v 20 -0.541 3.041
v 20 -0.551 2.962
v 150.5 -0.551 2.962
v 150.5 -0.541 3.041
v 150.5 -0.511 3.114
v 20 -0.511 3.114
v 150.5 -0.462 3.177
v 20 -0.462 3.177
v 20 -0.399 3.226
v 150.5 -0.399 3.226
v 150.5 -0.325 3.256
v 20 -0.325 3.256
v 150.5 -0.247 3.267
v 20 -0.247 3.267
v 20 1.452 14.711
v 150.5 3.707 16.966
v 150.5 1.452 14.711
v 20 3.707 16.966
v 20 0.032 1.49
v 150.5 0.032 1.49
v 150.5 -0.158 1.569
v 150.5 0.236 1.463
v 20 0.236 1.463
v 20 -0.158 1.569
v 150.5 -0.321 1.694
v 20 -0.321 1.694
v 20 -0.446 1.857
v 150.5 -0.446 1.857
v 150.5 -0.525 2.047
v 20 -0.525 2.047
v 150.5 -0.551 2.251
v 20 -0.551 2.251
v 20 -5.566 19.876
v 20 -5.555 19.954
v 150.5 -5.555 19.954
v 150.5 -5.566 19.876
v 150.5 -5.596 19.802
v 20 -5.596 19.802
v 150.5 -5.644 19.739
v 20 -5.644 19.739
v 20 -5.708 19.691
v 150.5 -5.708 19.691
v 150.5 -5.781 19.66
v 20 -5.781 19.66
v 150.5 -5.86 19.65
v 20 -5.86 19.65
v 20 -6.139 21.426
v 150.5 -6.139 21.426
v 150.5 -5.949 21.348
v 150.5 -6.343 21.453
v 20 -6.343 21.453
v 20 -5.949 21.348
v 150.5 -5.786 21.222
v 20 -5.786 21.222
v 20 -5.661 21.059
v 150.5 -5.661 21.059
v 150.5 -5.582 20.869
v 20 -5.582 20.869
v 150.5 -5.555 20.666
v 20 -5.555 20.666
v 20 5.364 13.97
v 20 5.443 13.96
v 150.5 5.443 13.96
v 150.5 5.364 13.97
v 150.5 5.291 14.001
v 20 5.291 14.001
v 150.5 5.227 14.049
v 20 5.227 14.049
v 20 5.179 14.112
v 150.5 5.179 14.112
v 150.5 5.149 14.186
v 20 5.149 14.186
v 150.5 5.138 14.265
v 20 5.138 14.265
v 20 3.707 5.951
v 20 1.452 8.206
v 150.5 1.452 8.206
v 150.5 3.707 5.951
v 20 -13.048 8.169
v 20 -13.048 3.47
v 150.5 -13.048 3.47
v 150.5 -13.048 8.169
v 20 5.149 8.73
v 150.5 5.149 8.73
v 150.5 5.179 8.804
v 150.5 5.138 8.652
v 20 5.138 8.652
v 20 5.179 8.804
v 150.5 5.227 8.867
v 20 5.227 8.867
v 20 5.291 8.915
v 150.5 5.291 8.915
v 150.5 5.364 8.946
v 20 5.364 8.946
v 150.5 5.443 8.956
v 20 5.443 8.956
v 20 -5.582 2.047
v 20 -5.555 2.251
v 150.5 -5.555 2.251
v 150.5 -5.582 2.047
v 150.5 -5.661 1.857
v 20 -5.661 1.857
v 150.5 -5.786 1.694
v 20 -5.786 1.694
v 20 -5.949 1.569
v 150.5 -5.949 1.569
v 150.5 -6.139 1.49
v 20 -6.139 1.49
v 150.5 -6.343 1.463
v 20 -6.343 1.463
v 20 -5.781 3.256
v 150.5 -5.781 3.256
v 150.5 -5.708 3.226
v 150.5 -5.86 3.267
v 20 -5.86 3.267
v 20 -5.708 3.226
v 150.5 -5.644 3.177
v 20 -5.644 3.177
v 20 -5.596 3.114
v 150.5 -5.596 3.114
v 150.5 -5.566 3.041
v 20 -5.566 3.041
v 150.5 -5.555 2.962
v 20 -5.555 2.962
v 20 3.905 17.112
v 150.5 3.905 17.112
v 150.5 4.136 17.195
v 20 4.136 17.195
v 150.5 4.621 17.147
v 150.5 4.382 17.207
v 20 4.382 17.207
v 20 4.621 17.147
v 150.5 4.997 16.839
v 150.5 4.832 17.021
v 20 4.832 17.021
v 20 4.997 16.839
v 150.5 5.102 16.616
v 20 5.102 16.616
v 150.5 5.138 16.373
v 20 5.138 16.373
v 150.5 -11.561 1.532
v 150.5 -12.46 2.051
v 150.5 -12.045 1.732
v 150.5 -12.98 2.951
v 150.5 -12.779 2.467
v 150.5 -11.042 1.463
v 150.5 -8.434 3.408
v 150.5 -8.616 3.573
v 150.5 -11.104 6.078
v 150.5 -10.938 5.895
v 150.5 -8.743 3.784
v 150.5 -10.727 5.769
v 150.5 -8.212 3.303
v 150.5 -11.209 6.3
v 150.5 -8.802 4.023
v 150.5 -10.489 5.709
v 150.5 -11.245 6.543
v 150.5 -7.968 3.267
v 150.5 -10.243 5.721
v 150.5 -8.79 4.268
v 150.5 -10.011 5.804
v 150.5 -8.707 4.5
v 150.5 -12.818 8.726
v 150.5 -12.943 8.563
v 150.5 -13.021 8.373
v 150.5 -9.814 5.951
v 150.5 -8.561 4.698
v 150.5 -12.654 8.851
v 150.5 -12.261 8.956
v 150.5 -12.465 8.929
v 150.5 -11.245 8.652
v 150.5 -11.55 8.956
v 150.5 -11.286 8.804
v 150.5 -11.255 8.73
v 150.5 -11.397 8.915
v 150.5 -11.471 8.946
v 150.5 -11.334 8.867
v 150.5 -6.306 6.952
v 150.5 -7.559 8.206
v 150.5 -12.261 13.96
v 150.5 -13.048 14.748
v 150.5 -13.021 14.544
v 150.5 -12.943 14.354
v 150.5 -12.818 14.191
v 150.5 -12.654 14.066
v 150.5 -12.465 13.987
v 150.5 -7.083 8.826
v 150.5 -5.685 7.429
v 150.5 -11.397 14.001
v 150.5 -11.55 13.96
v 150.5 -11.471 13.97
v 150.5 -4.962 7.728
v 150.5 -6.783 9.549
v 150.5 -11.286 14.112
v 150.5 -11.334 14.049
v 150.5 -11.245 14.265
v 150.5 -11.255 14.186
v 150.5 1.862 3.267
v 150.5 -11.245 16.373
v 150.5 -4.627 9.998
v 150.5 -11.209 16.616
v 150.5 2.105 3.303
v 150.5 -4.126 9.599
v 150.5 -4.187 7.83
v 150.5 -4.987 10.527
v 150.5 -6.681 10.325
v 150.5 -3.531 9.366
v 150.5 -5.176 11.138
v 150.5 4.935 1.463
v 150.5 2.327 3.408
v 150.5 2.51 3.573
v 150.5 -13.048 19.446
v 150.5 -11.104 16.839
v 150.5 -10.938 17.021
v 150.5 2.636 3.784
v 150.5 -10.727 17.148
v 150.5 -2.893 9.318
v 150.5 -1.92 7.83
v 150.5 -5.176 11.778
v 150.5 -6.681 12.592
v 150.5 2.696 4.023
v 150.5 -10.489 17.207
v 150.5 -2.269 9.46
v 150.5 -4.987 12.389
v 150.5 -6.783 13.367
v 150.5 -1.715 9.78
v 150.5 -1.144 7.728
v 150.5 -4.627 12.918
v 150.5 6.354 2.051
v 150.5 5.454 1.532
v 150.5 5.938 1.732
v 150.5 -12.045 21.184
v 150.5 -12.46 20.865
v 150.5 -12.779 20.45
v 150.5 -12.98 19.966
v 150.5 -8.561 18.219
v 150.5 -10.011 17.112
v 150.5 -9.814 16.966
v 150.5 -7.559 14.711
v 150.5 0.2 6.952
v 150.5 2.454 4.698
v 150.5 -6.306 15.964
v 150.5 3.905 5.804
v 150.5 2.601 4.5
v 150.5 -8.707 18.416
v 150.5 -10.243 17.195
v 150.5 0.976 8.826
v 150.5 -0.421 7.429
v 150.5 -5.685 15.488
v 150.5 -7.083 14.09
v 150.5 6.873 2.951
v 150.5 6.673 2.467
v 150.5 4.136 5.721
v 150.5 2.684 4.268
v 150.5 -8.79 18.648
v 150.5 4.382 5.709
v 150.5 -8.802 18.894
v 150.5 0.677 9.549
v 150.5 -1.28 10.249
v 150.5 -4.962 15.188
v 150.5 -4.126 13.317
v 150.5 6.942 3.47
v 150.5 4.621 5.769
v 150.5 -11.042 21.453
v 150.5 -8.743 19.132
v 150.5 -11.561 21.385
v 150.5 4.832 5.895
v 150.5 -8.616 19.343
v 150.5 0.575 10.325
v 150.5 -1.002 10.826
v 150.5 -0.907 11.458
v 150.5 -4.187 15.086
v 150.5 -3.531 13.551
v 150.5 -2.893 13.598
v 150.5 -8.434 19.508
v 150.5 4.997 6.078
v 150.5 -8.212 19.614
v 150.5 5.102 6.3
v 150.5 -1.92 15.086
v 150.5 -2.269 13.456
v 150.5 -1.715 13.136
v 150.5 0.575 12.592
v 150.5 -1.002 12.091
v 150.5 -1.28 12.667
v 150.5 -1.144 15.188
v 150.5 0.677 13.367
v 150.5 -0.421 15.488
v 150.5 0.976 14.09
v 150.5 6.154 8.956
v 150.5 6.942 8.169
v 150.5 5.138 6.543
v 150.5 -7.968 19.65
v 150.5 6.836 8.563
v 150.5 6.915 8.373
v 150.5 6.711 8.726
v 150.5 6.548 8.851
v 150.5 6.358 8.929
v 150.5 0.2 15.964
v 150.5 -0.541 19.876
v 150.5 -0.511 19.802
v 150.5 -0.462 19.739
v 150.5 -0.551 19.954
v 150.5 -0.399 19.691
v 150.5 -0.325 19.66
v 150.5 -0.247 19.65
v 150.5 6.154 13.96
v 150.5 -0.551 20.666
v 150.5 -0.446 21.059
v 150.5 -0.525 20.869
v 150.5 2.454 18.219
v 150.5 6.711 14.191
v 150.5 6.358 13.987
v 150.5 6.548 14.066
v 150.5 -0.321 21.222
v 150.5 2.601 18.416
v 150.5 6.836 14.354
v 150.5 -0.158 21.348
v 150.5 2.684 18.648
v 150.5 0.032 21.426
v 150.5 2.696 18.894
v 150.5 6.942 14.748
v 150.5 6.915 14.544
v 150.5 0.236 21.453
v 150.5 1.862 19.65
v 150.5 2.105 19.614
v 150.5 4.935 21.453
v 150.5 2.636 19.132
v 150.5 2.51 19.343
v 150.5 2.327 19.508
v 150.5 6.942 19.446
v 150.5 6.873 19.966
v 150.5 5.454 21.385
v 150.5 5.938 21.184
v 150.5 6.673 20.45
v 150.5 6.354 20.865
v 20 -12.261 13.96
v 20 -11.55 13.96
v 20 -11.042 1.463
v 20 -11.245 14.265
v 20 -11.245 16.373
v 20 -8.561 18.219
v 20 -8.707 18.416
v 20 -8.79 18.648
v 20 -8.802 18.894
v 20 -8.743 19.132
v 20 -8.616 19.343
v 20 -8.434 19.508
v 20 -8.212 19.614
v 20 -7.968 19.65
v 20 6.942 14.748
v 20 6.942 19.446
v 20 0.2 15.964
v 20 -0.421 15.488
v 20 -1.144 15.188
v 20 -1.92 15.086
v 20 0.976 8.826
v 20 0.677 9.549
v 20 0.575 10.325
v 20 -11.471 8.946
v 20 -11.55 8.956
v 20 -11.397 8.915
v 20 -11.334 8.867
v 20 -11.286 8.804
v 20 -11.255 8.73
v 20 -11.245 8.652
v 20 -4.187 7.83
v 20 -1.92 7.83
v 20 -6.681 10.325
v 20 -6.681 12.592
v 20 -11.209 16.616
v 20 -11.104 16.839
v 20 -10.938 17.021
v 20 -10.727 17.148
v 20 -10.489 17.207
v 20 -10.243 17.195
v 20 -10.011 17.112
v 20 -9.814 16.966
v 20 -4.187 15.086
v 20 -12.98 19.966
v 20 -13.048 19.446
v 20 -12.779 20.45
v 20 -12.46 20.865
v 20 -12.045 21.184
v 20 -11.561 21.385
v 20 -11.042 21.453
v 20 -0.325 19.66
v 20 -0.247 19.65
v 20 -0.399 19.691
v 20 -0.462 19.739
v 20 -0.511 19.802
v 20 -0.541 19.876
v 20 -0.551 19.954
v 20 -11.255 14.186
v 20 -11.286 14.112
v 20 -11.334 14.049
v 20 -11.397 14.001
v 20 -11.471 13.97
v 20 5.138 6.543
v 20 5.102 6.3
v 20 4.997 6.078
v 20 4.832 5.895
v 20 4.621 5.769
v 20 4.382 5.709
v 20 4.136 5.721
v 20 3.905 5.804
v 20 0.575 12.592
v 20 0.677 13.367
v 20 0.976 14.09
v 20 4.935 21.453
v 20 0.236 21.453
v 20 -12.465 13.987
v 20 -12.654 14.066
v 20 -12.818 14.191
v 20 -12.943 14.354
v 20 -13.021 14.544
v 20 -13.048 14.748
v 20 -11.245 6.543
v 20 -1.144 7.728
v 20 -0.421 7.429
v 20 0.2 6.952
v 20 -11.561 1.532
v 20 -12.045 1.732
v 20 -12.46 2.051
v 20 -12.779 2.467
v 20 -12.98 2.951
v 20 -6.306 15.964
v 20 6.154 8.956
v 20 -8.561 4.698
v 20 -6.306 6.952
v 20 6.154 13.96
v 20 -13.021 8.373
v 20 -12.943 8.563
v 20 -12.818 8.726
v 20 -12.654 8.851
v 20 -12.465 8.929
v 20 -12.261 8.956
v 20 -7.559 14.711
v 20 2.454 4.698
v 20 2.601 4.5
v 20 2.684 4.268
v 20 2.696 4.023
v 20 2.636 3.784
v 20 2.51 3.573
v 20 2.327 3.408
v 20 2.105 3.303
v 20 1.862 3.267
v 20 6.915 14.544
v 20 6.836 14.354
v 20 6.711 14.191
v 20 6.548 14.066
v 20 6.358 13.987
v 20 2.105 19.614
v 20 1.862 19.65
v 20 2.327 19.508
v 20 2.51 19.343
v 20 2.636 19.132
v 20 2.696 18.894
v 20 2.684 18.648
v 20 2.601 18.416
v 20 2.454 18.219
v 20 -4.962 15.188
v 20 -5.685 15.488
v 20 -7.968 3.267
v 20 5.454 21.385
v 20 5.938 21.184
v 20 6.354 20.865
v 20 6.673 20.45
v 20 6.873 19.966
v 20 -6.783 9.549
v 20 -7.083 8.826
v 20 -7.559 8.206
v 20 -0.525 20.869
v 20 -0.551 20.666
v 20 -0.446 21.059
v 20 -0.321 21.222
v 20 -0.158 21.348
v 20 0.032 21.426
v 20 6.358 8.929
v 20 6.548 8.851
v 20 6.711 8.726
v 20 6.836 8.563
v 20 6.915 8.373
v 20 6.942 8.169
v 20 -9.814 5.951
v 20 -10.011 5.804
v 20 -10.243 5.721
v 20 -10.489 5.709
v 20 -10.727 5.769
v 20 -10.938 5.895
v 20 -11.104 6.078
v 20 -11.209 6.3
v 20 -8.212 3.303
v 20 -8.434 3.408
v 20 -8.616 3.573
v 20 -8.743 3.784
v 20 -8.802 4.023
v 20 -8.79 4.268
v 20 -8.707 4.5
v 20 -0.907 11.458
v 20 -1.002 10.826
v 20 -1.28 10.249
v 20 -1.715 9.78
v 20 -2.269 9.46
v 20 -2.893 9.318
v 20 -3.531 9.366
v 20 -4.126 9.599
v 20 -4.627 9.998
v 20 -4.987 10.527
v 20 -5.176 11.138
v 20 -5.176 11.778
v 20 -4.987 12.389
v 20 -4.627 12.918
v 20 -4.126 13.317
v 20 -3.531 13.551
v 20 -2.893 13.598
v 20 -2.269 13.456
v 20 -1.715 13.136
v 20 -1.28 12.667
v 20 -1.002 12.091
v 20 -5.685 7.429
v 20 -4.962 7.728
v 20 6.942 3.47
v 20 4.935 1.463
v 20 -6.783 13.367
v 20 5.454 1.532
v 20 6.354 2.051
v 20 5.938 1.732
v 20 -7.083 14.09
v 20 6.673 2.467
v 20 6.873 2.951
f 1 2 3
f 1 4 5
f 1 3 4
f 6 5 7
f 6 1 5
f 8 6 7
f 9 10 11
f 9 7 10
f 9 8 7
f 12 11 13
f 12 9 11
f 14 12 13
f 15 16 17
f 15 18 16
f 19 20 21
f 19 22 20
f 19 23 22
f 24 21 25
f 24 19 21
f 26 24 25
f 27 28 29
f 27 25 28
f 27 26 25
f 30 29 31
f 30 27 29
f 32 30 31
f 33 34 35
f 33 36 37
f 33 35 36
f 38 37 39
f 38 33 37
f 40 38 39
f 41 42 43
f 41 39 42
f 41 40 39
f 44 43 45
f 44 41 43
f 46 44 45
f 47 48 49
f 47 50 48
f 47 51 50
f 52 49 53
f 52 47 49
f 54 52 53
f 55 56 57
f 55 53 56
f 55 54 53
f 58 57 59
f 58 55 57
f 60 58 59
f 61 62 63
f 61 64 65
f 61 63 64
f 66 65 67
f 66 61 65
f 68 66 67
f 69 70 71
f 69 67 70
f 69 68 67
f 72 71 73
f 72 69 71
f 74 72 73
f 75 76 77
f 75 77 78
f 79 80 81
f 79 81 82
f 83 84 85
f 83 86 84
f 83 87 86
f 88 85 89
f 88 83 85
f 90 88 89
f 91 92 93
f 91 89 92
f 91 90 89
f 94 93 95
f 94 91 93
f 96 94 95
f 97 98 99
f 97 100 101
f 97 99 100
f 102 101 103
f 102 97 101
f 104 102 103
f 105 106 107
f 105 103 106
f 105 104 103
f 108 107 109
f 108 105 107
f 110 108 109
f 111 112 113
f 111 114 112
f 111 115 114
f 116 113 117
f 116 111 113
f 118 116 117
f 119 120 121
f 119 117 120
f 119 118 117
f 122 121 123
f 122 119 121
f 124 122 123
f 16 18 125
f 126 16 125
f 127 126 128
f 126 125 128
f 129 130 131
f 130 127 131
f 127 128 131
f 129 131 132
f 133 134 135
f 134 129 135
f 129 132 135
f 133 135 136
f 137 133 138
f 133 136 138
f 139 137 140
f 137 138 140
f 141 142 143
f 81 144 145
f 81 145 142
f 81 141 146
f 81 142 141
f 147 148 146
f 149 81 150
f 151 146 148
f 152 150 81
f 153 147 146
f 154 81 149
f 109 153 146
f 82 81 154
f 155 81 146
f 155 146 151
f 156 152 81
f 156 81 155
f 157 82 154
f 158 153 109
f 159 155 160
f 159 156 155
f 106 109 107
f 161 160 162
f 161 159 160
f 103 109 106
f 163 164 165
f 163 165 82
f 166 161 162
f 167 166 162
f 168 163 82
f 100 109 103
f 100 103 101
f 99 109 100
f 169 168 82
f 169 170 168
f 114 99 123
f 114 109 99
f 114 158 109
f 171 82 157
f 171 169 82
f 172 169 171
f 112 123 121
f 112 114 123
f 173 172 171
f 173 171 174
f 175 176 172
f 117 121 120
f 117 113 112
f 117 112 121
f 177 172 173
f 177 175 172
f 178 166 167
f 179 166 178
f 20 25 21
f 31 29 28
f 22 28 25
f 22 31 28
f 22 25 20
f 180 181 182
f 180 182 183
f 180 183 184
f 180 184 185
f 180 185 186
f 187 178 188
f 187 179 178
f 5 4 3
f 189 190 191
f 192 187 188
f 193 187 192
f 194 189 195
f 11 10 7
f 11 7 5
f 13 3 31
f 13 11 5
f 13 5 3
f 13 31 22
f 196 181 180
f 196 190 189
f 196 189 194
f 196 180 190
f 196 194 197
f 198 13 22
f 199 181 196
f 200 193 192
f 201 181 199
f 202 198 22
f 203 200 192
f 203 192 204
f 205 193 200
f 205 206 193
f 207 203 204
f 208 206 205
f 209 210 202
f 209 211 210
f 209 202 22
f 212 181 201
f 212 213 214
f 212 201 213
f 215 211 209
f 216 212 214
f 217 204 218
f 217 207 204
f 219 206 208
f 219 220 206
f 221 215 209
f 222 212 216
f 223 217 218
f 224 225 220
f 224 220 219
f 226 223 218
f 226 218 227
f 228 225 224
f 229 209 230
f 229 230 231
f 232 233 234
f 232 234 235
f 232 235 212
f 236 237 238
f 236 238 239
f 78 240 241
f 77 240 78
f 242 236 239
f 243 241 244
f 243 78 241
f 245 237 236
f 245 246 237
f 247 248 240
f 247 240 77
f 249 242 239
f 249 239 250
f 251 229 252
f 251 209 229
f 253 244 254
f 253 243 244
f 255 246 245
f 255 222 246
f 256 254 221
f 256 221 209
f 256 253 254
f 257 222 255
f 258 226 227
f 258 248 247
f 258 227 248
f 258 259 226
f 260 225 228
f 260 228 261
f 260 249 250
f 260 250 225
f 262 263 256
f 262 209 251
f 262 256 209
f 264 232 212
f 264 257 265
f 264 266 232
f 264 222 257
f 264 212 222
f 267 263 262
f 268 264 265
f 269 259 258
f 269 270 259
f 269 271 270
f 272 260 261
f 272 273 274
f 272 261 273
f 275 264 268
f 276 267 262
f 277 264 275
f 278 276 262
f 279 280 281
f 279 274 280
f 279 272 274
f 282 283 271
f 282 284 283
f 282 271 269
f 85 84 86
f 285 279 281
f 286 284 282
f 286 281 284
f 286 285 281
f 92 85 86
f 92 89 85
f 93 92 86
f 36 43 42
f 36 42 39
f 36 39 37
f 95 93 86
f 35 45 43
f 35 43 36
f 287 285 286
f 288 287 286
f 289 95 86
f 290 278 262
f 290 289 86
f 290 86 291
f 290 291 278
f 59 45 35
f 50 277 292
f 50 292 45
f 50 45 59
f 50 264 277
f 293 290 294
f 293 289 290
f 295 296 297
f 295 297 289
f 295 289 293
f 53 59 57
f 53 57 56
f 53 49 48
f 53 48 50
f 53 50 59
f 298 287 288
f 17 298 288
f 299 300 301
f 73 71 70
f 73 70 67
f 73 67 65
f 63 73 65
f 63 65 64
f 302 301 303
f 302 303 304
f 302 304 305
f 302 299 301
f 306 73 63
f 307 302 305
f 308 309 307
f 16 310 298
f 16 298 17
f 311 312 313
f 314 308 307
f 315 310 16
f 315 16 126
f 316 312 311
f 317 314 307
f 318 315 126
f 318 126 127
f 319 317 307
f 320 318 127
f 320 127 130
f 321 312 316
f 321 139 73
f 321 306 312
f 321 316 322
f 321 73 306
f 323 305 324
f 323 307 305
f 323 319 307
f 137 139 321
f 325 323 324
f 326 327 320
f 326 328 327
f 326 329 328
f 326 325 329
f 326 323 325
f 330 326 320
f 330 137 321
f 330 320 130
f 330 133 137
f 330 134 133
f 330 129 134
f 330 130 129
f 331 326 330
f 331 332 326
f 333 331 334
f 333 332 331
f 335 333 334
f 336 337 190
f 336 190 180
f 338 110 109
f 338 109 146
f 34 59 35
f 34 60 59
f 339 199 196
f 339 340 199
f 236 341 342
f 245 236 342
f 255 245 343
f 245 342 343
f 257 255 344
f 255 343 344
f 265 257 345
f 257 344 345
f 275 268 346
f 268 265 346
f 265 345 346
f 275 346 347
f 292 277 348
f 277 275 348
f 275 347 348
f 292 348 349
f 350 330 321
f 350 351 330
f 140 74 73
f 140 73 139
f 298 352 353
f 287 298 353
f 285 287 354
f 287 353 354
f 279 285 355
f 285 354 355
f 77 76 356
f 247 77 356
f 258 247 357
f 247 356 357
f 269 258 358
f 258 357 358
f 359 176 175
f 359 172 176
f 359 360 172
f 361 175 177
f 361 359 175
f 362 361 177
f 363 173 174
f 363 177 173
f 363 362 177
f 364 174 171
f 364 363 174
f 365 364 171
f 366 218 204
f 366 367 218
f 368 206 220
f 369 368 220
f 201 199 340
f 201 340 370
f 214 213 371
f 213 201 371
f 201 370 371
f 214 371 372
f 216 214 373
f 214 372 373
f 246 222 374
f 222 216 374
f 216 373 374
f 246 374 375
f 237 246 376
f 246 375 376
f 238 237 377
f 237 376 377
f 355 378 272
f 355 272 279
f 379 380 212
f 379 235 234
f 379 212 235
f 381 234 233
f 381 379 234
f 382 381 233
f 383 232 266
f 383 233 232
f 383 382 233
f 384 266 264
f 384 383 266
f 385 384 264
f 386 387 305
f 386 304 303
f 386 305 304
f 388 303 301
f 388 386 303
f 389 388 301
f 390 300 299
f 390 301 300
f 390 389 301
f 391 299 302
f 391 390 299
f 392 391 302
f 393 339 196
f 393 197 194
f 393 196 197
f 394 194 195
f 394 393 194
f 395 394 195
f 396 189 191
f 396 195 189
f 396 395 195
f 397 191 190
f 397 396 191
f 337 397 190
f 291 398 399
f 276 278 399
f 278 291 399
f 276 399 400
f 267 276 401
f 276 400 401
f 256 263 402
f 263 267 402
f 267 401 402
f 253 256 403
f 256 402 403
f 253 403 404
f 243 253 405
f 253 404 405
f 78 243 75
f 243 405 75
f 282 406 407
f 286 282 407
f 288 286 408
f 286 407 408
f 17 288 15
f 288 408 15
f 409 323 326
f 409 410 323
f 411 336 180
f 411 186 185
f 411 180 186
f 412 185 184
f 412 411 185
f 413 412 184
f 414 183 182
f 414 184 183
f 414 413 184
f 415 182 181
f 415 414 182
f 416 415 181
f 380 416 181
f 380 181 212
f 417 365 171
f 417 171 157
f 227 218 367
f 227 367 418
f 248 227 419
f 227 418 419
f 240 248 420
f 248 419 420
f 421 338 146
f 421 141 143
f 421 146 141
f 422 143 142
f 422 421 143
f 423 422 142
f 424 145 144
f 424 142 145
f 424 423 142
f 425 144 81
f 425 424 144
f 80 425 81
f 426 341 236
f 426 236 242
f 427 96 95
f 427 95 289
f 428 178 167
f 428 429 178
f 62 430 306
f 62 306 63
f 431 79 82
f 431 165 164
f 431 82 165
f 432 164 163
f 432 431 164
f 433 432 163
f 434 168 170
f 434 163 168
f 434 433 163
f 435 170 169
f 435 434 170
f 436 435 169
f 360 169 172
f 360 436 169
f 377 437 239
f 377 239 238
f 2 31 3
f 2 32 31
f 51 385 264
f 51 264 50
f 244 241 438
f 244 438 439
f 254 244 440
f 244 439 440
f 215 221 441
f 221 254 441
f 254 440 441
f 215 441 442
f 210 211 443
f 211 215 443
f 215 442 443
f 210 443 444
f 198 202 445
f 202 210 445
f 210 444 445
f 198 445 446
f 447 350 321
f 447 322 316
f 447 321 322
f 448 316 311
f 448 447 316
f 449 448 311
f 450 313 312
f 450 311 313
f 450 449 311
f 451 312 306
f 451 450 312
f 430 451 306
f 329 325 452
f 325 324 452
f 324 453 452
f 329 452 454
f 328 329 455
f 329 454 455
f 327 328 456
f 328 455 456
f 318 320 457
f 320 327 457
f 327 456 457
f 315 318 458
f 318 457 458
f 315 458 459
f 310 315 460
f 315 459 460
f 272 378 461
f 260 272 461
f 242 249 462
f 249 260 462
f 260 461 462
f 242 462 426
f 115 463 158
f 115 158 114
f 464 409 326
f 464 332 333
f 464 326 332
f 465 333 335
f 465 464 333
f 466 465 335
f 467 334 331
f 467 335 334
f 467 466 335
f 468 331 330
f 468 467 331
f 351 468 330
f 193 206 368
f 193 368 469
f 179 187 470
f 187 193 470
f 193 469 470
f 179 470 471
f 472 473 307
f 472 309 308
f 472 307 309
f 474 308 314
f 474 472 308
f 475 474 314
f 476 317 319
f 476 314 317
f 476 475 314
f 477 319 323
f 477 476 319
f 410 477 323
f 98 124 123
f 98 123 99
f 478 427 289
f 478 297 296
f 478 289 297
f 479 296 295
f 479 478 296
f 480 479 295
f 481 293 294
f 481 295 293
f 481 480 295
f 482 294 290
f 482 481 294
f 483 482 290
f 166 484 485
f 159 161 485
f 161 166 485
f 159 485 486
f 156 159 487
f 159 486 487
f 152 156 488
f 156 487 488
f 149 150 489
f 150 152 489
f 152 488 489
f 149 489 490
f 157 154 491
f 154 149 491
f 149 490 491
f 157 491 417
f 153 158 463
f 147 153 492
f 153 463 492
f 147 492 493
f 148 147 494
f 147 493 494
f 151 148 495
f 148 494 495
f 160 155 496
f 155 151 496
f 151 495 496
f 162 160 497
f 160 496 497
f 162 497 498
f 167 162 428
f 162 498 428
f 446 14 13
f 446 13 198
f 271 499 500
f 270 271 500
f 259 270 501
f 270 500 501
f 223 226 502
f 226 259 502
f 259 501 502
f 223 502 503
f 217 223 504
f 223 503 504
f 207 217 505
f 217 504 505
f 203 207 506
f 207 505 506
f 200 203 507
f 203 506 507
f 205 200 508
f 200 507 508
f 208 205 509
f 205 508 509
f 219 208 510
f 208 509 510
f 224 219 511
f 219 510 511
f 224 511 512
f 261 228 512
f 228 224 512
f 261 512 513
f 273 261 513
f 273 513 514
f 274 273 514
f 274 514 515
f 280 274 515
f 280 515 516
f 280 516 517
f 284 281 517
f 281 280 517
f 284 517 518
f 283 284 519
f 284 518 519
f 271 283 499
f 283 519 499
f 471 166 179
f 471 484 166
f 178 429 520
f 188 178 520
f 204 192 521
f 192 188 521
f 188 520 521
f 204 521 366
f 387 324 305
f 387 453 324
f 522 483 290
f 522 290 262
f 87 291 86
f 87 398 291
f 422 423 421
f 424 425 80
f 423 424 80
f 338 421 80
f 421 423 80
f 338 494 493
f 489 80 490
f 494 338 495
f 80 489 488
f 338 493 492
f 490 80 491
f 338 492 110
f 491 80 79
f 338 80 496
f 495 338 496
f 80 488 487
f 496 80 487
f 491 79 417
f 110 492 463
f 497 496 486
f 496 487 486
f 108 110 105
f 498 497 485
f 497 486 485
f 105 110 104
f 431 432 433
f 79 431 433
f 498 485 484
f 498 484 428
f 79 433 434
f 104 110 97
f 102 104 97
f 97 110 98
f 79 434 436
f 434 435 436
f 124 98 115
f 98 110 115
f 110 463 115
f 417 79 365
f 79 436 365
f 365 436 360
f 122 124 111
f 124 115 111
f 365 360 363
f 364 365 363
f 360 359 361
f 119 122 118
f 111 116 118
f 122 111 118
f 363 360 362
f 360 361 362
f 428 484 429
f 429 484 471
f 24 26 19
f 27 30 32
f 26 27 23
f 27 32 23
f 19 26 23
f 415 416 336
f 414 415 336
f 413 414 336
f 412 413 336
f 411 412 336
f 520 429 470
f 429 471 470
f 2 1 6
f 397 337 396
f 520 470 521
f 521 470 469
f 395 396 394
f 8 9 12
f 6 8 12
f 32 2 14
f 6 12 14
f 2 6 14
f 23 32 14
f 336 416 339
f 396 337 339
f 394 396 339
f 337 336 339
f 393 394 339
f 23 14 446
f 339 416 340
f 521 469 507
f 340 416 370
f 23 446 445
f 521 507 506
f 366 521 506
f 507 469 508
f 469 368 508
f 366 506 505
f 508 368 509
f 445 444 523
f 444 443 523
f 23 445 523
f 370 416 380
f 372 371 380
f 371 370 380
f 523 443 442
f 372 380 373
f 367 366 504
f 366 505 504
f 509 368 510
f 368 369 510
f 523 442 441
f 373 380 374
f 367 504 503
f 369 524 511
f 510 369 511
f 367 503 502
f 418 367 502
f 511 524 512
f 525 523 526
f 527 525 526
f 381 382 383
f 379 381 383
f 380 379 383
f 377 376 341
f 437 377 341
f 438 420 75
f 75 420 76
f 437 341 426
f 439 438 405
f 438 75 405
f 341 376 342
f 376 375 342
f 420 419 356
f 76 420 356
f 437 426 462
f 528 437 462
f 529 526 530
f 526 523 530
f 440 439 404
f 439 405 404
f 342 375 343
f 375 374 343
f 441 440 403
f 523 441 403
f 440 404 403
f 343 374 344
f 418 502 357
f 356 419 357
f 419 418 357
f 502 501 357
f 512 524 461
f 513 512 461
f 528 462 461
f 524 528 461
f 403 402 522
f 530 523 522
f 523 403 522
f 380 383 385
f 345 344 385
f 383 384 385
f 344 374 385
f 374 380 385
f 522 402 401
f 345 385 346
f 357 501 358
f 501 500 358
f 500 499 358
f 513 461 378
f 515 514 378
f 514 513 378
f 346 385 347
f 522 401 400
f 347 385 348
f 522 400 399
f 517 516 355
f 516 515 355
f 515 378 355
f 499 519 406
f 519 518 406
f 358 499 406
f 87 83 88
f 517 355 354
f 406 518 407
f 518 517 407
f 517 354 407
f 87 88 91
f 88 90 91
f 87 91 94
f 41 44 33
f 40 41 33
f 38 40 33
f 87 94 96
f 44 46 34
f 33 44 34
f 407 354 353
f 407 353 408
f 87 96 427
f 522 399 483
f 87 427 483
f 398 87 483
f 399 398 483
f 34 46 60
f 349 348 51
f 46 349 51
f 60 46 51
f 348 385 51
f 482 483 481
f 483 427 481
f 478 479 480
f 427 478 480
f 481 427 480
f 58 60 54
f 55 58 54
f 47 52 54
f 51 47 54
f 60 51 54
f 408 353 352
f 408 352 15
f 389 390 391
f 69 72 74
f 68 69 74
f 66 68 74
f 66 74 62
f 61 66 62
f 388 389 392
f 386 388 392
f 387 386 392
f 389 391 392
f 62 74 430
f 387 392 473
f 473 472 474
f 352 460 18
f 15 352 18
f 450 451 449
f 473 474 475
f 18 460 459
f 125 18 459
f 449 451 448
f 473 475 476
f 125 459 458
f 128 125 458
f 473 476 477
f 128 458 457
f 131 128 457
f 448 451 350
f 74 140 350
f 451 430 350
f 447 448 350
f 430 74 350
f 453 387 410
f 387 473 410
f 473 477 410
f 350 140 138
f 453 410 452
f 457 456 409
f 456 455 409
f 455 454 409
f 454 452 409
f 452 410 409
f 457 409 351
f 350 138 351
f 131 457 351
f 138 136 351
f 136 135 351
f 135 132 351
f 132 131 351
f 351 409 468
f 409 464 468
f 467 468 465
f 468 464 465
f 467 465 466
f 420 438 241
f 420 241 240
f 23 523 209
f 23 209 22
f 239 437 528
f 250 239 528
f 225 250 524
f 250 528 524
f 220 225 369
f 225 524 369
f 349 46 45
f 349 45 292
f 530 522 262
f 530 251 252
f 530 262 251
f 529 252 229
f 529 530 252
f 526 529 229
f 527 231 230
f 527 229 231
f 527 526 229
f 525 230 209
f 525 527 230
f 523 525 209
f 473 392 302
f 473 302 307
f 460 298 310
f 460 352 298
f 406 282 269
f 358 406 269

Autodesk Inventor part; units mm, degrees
ref_plane "XZ Plane" through (0, 0, 0) normal (0, 1, 0) x (-1, 0, 0)
ref_plane "Start Plane" through (20, 0, 0) normal (1, 0, 0) x (0, 1, 0)
ref_plane "End Plane" through (150.5, 0, 0) normal (1, 0, 0) x (0, 1, 0)
sketch "Sketch" plane through (0, 0, 0) normal (1, 0, 0) x (0, 1, 0)
  circle A0 centre (-3.0533, 11.4582) radius 2.1463
  line L0 (2.4543, 4.6976) -> (0.1995, 6.9525)
  arc A1 (1.8616, 3.2667) -> (2.4543, 4.6976) centre (1.8616, 4.1049) ccw
  line L1 (-0.2466, 3.2667) -> (1.8616, 3.2667)
  arc A2 (-0.2466, 3.2667) -> (-0.5514, 2.9619) centre (-0.2466, 2.9619) ccw
  line L2 (-0.5514, 2.2507) -> (-0.5514, 2.9619)
  arc A3 (-0.5514, 2.2507) -> (0.236, 1.4633) centre (0.236, 2.2507) ccw
  line L3 (4.935, 1.4633) -> (0.236, 1.4633)
  arc A4 (4.935, 1.4633) -> (6.9416, 3.4699) centre (4.935, 3.4699) ccw
  line L4 (6.9416, 8.1689) -> (6.9416, 3.4699)
  arc A5 (6.9416, 8.1689) -> (6.1542, 8.9563) centre (6.1542, 8.1689) ccw
  line L5 (5.443, 8.9563) -> (6.1542, 8.9563)
  arc A6 (5.443, 8.9563) -> (5.1382, 8.6515) centre (5.443, 8.6515) ccw
  line L6 (5.1382, 6.5433) -> (5.1382, 8.6515)
  arc A7 (3.7073, 5.9506) -> (5.1382, 6.5433) centre (4.3, 6.5433) ccw
  line L7 (1.4525, 8.2055) -> (3.7073, 5.9506)
  arc A8 (0.5746, 10.3248) -> (1.4525, 8.2055) centre (3.5718, 10.3248) ccw
  line L8 (0.5746, 12.5917) -> (0.5746, 10.3248)
  arc A9 (1.4525, 14.711) -> (0.5746, 12.5917) centre (3.5718, 12.5917) ccw
  line L9 (3.7073, 16.9658) -> (1.4525, 14.711)
  arc A10 (5.1382, 16.3731) -> (3.7073, 16.9658) centre (4.3, 16.3731) ccw
  line L10 (5.1382, 14.2649) -> (5.1382, 16.3731)
  arc A11 (5.1382, 14.2649) -> (5.443, 13.9601) centre (5.443, 14.2649) ccw
  line L11 (6.1542, 13.9601) -> (5.443, 13.9601)
  arc A12 (6.1542, 13.9601) -> (6.9416, 14.7475) centre (6.1542, 14.7475) ccw
  line L12 (6.9416, 19.4465) -> (6.9416, 14.7475)
  arc A13 (6.9416, 19.4465) -> (4.935, 21.4531) centre (4.935, 19.4465) ccw
  line L13 (0.236, 21.4531) -> (4.935, 21.4531)
  arc A14 (0.236, 21.4531) -> (-0.5514, 20.6657) centre (0.236, 20.6657) ccw
  line L14 (-0.5514, 19.9545) -> (-0.5514, 20.6657)
  arc A15 (-0.5514, 19.9545) -> (-0.2466, 19.6497) centre (-0.2466, 19.9545) ccw
  line L15 (1.8616, 19.6497) -> (-0.2466, 19.6497)
  arc A16 (2.4543, 18.2188) -> (1.8616, 19.6497) centre (1.8616, 18.8115) ccw
  line L16 (0.1995, 15.964) -> (2.4543, 18.2188)
  arc A17 (-1.9199, 15.0861) -> (0.1995, 15.964) centre (-1.9199, 18.0833) ccw
  line L17 (-4.1867, 15.0861) -> (-1.9199, 15.0861)
  arc A18 (-6.306, 15.964) -> (-4.1867, 15.0861) centre (-4.1867, 18.0833) ccw
  line L18 (-8.5609, 18.2188) -> (-6.306, 15.964)
  arc A19 (-7.9682, 19.6497) -> (-8.5609, 18.2188) centre (-7.9682, 18.8115) ccw
  line L19 (-5.86, 19.6497) -> (-7.9682, 19.6497)
  arc A20 (-5.86, 19.6497) -> (-5.5552, 19.9545) centre (-5.86, 19.9545) ccw
  line L20 (-5.5552, 20.6657) -> (-5.5552, 19.9545)
  arc A21 (-5.5552, 20.6657) -> (-6.3426, 21.4531) centre (-6.3426, 20.6657) ccw
  line L21 (-11.0416, 21.4531) -> (-6.3426, 21.4531)
  arc A22 (-11.0416, 21.4531) -> (-13.0482, 19.4465) centre (-11.0416, 19.4465) ccw
  line L22 (-13.0482, 14.7475) -> (-13.0482, 19.4465)
  arc A23 (-13.0482, 14.7475) -> (-12.2608, 13.9601) centre (-12.2608, 14.7475) ccw
  line L23 (-11.5496, 13.9601) -> (-12.2608, 13.9601)
  arc A24 (-11.5496, 13.9601) -> (-11.2448, 14.2649) centre (-11.5496, 14.2649) ccw
  line L24 (-11.2448, 16.3731) -> (-11.2448, 14.2649)
  arc A25 (-9.8139, 16.9658) -> (-11.2448, 16.3731) centre (-10.4066, 16.3731) ccw
  line L25 (-7.559, 14.711) -> (-9.8139, 16.9658)
  arc A26 (-6.6812, 12.5917) -> (-7.559, 14.711) centre (-9.6784, 12.5917) ccw
  line L26 (-6.6812, 10.3248) -> (-6.6812, 12.5917)
  arc A27 (-7.559, 8.2055) -> (-6.6812, 10.3248) centre (-9.6784, 10.3248) ccw
  line L27 (-9.8139, 5.9506) -> (-7.559, 8.2055)
  arc A28 (-11.2448, 6.5433) -> (-9.8139, 5.9506) centre (-10.4066, 6.5433) ccw
  line L28 (-11.2448, 8.6515) -> (-11.2448, 6.5433)
  arc A29 (-11.2448, 8.6515) -> (-11.5496, 8.9563) centre (-11.5496, 8.6515) ccw
  line L29 (-12.2608, 8.9563) -> (-11.5496, 8.9563)
  arc A30 (-12.2608, 8.9563) -> (-13.0482, 8.1689) centre (-12.2608, 8.1689) ccw
  line L30 (-13.0482, 3.4699) -> (-13.0482, 8.1689)
  arc A31 (-13.0482, 3.4699) -> (-11.0416, 1.4633) centre (-11.0416, 3.4699) ccw
  line L31 (-6.3426, 1.4633) -> (-11.0416, 1.4633)
  arc A32 (-6.3426, 1.4633) -> (-5.5552, 2.2507) centre (-6.3426, 2.2507) ccw
  line L32 (-5.5552, 2.9619) -> (-5.5552, 2.2507)
  arc A33 (-5.5552, 2.9619) -> (-5.86, 3.2667) centre (-5.86, 2.9619) ccw
  line L33 (-7.9682, 3.2667) -> (-5.86, 3.2667)
  arc A34 (-8.5609, 4.6976) -> (-7.9682, 3.2667) centre (-7.9682, 4.1049) ccw
  line L34 (-6.306, 6.9525) -> (-8.5609, 4.6976)
  arc A35 (-4.1867, 7.8303) -> (-6.306, 6.9525) centre (-4.1867, 4.8331) ccw
  line L35 (-1.9199, 7.8303) -> (-4.1867, 7.8303)
  arc A36 (0.1995, 6.9525) -> (-1.9199, 7.8303) centre (-1.9199, 4.8331) ccw
  point P0 (0, 0)
extrude "Body" add sketch "Sketch" along normal up to surface (130.5 mm away) from surface at 20
sketch "Sketch2" plane through (0, 0, 0) normal (1, 0, 0) x (0, 1, 0)
  line L0 (0, 0) -> (10, 0)
ref_plane "Work Plane3" through (0, 0, 0) normal (0, 0, -1) x (0, 1, 0)
sketch "Sketch3" plane through (0, 0, 0) normal (0, 0, -1) x (0, 1, 0)
  line L0 (-2, 20) -> (12, 20)
  line L1 (-2, 150.5) -> (12, 150.5)
  dimension "d7" = 130.5
equation "\"G_OFFSET_START\" = -20"
equation "\"G_OFFSET_END\" = -20"
equation "\"d2\" = -G_OFFSET_START"
equation "\"d3\" = length + G_OFFSET_END"
equation "\"G_L\" = d7"
equation "\"length\" = 170.5"
properties part number "Generic-1"
